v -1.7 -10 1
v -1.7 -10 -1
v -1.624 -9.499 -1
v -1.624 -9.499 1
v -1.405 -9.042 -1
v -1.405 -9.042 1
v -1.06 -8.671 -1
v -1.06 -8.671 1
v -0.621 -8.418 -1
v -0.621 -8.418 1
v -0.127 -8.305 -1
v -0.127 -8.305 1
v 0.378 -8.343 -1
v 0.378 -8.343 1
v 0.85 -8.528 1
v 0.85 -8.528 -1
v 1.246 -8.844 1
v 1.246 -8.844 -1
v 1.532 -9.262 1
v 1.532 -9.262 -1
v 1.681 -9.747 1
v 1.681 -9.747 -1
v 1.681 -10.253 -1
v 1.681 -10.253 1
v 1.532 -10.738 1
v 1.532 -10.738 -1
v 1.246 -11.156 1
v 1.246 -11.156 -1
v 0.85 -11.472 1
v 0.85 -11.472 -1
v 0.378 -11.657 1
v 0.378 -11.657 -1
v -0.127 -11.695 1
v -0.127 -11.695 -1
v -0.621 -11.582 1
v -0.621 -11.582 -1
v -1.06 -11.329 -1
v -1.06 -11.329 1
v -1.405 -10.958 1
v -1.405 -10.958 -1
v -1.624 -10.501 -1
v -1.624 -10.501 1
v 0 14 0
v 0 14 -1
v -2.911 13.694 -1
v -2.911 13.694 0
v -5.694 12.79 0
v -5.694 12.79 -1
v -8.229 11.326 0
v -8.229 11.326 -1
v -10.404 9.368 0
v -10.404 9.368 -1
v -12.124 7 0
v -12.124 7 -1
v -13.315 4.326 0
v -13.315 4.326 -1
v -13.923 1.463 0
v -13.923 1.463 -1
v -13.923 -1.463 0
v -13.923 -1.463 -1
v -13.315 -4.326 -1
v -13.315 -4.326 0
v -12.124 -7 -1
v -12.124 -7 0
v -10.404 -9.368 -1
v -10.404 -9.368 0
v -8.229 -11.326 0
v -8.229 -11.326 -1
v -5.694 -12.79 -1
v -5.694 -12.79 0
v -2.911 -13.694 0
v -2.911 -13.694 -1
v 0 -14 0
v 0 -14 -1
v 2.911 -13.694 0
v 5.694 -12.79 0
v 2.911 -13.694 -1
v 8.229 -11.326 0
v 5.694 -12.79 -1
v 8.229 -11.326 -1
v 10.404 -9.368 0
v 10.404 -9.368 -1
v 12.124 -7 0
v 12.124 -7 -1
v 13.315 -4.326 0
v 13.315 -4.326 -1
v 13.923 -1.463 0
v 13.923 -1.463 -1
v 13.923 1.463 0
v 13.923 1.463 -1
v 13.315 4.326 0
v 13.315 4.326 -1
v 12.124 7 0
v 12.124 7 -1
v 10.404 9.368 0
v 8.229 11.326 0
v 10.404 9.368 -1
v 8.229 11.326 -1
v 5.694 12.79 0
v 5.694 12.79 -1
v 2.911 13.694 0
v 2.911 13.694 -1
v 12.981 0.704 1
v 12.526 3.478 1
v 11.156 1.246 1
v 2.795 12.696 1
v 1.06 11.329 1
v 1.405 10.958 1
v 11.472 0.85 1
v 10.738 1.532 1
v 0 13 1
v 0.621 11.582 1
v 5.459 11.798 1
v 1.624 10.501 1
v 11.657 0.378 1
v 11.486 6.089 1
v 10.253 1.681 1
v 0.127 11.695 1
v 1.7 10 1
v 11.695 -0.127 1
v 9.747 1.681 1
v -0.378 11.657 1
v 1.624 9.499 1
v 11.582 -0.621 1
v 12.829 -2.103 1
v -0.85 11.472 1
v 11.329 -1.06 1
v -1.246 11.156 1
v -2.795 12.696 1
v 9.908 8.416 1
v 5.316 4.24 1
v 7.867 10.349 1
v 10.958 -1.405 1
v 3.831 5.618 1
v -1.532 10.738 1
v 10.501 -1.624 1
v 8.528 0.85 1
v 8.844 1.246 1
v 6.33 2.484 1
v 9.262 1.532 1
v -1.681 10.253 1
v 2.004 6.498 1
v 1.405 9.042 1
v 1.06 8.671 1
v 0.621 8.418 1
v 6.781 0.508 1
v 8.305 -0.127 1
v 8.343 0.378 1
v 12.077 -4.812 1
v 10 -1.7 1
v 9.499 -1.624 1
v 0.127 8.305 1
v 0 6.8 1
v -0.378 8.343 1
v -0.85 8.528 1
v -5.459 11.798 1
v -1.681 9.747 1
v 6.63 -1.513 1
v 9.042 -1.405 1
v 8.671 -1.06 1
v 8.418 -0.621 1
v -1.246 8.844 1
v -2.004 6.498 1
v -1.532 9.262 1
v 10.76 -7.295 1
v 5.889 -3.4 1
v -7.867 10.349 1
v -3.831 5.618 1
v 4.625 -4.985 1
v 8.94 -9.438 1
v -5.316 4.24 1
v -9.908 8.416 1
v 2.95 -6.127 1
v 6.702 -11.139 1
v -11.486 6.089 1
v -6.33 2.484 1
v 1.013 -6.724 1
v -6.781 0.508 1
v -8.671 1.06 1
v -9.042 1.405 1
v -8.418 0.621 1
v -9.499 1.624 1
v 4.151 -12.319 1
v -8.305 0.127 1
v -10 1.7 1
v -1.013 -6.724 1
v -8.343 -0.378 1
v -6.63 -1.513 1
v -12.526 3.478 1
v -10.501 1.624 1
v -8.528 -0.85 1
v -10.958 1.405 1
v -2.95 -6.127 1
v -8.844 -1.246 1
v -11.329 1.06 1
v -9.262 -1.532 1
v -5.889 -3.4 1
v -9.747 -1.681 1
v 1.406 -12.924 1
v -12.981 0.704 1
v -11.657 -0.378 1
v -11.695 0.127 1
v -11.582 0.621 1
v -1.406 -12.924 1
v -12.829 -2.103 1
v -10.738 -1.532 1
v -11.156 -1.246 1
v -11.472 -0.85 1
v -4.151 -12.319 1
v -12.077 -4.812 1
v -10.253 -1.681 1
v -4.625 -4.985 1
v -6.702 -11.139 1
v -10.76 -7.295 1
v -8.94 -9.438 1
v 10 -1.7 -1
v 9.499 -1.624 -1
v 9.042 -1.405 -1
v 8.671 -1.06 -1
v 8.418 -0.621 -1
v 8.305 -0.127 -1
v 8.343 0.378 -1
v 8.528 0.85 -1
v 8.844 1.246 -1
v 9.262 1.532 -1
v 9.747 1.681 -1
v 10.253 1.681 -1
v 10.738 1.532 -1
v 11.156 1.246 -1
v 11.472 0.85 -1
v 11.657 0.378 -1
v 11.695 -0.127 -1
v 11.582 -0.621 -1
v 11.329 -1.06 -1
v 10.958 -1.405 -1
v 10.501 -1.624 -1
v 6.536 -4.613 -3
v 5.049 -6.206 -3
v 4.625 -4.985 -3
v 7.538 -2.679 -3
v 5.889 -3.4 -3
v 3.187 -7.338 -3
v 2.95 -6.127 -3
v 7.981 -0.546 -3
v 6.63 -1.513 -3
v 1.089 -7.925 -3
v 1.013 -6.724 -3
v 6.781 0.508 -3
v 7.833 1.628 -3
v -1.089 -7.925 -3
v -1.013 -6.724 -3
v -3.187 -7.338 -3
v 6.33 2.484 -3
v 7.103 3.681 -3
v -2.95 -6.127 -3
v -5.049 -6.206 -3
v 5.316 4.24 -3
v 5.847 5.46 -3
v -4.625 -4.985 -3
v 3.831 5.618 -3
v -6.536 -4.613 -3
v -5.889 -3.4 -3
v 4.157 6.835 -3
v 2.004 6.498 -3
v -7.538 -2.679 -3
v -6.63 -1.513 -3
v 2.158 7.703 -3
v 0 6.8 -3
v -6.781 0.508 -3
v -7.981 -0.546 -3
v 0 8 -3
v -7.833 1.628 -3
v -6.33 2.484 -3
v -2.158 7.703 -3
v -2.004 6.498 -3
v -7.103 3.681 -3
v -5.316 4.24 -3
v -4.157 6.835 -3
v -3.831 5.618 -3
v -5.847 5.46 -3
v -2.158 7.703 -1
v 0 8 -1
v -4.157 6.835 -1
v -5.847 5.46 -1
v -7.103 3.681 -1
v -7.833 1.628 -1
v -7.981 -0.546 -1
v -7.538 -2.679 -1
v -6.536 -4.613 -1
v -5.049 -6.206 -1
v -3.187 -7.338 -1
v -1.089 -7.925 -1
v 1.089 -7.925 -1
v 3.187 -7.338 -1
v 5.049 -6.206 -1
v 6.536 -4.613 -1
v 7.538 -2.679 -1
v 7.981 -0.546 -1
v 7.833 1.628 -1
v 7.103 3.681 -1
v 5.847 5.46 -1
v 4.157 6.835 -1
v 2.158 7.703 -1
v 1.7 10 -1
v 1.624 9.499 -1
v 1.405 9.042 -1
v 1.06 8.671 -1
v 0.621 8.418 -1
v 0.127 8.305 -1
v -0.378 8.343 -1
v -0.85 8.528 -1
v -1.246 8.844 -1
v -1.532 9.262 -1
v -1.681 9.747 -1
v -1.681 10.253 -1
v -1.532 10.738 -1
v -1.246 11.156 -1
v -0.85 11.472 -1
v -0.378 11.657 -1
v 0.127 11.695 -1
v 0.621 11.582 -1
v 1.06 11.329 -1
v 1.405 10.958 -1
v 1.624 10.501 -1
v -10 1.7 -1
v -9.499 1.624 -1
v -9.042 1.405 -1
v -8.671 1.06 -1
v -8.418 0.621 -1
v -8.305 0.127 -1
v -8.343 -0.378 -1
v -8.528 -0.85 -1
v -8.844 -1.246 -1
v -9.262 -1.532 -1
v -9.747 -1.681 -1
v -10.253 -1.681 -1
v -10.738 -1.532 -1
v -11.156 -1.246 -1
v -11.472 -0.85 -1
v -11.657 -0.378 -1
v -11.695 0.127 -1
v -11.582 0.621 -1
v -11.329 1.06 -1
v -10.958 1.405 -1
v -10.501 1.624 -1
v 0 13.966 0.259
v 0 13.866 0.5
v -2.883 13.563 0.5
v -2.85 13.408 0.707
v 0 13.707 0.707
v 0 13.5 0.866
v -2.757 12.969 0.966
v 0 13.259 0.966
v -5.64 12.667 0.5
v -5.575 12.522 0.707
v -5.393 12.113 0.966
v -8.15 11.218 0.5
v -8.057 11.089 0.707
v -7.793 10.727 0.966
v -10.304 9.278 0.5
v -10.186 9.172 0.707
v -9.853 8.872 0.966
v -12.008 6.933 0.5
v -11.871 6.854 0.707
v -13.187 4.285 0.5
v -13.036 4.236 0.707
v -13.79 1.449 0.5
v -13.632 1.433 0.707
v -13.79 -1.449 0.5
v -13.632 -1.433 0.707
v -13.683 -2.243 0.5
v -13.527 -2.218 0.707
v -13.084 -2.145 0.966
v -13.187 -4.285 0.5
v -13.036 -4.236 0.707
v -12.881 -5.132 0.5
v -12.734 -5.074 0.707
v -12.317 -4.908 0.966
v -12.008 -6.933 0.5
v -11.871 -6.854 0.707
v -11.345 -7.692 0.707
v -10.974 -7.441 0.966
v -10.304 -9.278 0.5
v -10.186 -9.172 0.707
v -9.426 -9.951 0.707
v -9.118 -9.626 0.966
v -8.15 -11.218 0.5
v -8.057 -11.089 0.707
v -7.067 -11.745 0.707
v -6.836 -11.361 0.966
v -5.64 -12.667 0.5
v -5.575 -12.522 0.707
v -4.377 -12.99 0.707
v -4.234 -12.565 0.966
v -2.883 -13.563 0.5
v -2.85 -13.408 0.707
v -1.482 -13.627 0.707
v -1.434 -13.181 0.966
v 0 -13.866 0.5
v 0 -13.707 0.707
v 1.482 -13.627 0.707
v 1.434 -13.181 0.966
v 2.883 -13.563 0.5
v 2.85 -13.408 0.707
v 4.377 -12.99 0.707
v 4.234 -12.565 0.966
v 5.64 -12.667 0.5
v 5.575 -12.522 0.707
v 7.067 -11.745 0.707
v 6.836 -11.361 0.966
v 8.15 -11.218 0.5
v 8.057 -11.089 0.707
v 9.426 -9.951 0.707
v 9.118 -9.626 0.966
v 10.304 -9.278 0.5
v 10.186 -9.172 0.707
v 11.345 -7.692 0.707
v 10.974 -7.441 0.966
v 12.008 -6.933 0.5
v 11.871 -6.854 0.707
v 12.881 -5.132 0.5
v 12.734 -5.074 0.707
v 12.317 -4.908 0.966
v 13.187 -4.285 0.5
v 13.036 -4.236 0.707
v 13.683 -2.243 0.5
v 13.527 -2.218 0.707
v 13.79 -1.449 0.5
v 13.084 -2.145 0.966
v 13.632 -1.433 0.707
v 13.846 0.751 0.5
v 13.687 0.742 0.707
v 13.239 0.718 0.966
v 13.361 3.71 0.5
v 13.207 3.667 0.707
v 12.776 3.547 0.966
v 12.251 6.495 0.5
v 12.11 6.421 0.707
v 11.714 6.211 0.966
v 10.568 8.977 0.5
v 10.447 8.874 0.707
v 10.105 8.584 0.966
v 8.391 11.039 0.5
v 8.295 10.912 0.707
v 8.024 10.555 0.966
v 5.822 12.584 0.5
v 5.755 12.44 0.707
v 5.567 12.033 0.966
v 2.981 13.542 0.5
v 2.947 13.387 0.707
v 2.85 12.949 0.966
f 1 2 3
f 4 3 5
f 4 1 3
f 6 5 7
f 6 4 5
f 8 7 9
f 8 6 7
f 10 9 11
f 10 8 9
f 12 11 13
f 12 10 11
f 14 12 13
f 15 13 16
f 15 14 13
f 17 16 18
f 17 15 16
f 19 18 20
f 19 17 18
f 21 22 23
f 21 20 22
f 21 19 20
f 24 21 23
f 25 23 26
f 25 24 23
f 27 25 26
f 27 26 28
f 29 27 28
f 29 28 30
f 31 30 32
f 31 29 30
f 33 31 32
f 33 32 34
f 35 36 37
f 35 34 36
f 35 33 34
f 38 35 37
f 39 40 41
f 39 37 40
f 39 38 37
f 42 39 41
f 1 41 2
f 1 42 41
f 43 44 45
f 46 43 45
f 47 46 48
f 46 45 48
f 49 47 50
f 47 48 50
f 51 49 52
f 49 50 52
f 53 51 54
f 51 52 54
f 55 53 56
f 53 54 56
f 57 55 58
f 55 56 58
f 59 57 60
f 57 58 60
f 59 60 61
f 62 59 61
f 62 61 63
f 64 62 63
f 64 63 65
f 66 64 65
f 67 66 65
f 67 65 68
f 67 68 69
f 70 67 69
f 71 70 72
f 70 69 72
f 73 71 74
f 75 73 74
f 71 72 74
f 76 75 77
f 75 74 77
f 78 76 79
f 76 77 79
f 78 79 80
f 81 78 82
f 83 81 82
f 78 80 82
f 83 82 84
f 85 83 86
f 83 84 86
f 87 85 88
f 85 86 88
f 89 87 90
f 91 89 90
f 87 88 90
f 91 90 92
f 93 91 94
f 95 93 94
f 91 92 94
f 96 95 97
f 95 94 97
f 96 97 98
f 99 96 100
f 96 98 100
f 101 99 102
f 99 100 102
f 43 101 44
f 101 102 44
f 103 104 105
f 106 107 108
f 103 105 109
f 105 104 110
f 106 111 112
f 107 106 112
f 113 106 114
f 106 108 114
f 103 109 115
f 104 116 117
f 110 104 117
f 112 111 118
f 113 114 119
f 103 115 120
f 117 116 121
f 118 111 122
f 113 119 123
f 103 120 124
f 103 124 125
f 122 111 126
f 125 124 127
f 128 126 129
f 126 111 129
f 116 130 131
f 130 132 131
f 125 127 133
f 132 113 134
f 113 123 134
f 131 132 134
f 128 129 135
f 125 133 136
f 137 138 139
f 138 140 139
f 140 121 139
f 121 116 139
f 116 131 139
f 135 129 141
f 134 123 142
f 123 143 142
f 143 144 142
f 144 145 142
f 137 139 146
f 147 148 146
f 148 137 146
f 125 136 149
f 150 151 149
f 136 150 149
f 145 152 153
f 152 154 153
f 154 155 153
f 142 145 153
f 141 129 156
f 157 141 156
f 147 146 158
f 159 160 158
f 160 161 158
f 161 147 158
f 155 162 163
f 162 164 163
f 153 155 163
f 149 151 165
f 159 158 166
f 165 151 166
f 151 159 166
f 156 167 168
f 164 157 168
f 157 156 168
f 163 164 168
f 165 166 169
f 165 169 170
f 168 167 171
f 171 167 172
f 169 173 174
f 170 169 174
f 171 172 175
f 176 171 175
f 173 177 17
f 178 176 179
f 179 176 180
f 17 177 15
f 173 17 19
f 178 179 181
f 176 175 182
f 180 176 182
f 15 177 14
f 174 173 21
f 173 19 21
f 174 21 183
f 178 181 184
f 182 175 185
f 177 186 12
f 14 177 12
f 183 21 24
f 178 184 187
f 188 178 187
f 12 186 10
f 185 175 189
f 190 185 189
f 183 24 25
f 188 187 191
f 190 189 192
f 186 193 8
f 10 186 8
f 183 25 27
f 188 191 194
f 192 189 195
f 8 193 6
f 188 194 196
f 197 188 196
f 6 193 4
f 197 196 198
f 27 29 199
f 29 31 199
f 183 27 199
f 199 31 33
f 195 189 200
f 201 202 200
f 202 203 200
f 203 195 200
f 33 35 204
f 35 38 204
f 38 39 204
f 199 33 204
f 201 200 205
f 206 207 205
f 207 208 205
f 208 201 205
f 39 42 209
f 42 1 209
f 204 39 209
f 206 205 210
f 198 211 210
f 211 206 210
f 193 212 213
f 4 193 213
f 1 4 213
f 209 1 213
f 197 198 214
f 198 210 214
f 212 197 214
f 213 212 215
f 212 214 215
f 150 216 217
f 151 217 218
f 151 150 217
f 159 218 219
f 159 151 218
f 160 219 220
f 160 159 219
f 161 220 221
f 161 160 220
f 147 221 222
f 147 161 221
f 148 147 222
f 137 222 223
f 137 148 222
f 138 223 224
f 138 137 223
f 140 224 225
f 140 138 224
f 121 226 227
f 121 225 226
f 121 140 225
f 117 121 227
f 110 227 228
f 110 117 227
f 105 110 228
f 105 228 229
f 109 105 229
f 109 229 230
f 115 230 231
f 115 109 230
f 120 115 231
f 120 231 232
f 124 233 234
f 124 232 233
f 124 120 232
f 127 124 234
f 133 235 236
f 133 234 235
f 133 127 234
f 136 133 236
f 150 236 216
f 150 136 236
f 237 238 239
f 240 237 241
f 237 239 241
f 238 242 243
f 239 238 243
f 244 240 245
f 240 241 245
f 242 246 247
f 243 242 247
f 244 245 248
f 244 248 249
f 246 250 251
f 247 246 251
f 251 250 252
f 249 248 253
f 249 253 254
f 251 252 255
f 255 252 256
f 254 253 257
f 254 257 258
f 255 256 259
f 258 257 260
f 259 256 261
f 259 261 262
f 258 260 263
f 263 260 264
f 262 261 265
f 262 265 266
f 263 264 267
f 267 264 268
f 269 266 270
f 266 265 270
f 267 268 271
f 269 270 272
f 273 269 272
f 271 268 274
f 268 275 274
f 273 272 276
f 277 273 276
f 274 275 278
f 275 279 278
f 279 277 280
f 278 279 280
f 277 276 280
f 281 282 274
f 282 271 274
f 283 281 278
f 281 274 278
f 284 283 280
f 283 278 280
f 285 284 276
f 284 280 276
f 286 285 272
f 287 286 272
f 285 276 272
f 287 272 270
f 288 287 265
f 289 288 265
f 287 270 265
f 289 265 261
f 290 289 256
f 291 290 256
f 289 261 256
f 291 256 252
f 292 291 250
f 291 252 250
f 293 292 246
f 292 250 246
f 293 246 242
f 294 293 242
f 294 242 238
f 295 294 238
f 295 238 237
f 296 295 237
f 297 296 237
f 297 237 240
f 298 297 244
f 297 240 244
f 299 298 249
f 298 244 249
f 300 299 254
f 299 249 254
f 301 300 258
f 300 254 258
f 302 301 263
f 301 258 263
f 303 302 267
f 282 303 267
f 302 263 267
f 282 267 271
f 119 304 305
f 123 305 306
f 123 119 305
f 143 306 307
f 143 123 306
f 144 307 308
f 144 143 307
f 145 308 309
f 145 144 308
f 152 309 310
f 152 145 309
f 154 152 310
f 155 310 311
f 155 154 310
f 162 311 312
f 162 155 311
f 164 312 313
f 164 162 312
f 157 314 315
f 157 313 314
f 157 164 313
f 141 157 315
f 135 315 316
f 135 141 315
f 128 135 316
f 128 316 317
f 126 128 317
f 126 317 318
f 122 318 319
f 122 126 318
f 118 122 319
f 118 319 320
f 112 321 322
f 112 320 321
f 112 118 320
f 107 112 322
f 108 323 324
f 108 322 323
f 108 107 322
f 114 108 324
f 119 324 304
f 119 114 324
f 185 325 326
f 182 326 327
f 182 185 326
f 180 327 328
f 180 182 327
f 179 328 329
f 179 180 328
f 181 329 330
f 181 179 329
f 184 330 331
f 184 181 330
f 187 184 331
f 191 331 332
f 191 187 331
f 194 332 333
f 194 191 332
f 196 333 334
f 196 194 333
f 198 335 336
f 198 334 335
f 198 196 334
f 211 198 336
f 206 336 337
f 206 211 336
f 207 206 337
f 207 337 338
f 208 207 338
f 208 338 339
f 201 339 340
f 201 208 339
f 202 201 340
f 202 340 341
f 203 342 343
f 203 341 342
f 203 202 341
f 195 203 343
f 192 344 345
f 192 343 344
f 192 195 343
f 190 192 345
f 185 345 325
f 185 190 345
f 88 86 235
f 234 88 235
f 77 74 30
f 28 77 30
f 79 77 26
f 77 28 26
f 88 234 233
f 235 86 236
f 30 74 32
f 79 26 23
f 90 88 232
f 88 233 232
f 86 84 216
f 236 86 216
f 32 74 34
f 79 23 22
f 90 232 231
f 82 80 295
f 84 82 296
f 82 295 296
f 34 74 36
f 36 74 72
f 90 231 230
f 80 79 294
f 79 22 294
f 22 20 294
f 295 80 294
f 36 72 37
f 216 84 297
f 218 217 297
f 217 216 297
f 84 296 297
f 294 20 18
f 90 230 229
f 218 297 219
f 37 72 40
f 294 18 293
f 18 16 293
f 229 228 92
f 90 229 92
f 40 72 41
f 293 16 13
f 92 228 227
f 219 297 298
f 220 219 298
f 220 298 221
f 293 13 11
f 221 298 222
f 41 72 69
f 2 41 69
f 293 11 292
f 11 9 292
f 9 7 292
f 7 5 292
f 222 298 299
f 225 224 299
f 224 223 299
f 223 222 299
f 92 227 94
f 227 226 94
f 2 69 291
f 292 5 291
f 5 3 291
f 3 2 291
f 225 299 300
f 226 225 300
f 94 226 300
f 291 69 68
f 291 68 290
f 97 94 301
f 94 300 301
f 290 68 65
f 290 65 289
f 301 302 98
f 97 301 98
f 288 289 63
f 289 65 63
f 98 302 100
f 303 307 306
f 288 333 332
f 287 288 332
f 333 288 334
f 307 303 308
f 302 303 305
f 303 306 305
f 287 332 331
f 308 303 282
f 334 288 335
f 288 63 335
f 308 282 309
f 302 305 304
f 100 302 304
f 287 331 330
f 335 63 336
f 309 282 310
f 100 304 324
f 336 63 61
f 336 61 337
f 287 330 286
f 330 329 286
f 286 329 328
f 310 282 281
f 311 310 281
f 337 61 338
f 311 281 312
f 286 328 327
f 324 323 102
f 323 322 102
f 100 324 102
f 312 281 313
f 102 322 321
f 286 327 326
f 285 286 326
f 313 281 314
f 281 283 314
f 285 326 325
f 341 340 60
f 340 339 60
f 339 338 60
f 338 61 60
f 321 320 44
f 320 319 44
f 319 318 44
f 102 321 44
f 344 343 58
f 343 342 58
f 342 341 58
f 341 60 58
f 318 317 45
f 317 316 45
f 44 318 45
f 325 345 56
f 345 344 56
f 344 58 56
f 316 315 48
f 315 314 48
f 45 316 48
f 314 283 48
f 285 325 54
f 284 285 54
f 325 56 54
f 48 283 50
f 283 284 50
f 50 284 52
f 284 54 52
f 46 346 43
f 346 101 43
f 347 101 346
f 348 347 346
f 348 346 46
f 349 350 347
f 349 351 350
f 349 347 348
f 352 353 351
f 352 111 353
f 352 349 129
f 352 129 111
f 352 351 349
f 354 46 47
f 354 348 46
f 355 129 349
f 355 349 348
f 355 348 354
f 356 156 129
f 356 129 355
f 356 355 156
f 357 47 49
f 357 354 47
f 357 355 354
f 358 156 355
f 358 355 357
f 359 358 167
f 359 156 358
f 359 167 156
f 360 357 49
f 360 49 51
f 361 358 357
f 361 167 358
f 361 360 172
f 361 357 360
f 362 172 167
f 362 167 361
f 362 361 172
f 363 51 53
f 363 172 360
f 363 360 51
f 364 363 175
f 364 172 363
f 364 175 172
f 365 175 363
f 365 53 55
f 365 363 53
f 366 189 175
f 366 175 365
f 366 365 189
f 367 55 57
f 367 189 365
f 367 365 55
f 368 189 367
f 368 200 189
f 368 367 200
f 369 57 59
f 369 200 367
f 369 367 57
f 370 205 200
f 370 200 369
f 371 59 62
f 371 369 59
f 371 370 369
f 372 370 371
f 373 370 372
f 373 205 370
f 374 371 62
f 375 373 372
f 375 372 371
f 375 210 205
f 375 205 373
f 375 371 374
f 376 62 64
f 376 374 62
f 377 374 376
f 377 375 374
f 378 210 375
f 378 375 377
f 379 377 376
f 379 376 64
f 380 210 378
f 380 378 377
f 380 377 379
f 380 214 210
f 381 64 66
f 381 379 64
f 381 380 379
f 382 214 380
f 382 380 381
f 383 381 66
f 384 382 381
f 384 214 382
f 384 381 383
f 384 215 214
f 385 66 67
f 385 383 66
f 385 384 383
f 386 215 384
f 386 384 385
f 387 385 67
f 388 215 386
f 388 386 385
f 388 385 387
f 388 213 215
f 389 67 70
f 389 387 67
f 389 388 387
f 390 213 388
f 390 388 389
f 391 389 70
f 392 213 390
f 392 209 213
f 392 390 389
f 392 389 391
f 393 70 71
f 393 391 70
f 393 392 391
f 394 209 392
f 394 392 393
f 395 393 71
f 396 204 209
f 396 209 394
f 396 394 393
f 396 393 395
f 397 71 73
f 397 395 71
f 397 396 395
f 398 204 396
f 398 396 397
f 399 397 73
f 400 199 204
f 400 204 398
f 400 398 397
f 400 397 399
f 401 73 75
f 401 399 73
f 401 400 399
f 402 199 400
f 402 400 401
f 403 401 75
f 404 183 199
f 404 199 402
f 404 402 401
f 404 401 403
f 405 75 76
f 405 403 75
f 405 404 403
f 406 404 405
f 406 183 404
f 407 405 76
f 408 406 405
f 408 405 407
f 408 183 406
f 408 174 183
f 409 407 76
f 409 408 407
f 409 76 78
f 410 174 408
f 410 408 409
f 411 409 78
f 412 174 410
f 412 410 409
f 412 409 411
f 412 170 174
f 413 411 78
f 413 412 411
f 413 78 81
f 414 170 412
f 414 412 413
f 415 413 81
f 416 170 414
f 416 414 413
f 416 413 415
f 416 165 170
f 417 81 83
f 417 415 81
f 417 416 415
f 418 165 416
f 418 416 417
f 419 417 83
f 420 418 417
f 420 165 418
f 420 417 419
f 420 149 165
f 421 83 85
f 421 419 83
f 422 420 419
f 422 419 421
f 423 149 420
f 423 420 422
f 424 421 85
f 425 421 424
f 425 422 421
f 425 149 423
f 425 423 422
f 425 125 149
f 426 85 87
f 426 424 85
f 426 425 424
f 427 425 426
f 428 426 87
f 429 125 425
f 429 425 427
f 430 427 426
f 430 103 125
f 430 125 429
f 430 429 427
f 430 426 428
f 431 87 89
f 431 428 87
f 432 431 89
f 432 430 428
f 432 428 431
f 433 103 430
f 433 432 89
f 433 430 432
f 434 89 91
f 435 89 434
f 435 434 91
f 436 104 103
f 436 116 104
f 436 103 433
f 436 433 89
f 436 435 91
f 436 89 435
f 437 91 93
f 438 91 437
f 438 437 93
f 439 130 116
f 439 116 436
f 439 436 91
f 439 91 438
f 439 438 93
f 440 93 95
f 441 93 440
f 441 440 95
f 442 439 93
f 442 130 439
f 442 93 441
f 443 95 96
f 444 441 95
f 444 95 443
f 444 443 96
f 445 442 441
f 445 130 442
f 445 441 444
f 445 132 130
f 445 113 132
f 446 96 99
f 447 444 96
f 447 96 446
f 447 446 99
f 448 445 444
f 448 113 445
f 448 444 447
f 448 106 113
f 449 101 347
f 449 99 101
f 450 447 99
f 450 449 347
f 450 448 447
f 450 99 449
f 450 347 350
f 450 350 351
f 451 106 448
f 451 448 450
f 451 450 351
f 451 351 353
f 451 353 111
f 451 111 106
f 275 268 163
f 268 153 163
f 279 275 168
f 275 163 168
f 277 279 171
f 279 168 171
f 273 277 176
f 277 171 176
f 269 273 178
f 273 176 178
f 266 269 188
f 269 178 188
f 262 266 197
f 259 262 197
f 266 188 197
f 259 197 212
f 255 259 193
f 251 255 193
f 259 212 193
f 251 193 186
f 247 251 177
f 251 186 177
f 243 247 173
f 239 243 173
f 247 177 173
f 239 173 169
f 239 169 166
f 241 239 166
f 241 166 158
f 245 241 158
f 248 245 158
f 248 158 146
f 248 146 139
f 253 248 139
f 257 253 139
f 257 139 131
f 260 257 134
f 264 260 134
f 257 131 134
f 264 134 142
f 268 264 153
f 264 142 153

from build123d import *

# Parameters (mm, degrees)
CIRPATTERN1_COUNT = 4
FILLET1_R         = 1


with BuildPart() as part:
    # Sketch1 → Revolve1 (revolve)
    with BuildSketch(Plane(origin=(0, 0, 0), x_dir=(0, 0, -1), z_dir=(1, 0, 0))):
        Polygon((-1, 14), (1, 14), (1, 8), (3, 8), (3, 6.8), (-1, 6.8), align=None)
    revolve(axis=Axis((0, 0, -88.99), (0, 0, 1)))

    # Sketch4 → M3 Clearance Hole1 (revolve, cut)
    with BuildSketch(Plane(origin=(10, 0, 1), x_dir=(0, -1, 0), z_dir=(1, 0, 0))):
        Polygon((0, 0), (0, 9.021463052), (1.7, 8), (1.7, 0), align=None)
    m3_clearance_hole1 = revolve(axis=Axis((10, 0, 7.35), (0, 0, -1)), mode=Mode.SUBTRACT)

    # CirPattern1: M3 Clearance Hole1 ×4 about axis
    cirpattern1_axis = Axis((0, 0, -88.99), (0, 0, 1))
    for i in range(1, CIRPATTERN1_COUNT):
        add(m3_clearance_hole1.rotate(cirpattern1_axis, i * 360 / CIRPATTERN1_COUNT), mode=Mode.SUBTRACT)

    # Fillet1
    fillet1_edges = [part.edges().sort_by_distance(p)[0] for p in [
        (0, -14, 1),
    ]]
    fillet(fillet1_edges, radius=FILLET1_R)


solid = part.part
